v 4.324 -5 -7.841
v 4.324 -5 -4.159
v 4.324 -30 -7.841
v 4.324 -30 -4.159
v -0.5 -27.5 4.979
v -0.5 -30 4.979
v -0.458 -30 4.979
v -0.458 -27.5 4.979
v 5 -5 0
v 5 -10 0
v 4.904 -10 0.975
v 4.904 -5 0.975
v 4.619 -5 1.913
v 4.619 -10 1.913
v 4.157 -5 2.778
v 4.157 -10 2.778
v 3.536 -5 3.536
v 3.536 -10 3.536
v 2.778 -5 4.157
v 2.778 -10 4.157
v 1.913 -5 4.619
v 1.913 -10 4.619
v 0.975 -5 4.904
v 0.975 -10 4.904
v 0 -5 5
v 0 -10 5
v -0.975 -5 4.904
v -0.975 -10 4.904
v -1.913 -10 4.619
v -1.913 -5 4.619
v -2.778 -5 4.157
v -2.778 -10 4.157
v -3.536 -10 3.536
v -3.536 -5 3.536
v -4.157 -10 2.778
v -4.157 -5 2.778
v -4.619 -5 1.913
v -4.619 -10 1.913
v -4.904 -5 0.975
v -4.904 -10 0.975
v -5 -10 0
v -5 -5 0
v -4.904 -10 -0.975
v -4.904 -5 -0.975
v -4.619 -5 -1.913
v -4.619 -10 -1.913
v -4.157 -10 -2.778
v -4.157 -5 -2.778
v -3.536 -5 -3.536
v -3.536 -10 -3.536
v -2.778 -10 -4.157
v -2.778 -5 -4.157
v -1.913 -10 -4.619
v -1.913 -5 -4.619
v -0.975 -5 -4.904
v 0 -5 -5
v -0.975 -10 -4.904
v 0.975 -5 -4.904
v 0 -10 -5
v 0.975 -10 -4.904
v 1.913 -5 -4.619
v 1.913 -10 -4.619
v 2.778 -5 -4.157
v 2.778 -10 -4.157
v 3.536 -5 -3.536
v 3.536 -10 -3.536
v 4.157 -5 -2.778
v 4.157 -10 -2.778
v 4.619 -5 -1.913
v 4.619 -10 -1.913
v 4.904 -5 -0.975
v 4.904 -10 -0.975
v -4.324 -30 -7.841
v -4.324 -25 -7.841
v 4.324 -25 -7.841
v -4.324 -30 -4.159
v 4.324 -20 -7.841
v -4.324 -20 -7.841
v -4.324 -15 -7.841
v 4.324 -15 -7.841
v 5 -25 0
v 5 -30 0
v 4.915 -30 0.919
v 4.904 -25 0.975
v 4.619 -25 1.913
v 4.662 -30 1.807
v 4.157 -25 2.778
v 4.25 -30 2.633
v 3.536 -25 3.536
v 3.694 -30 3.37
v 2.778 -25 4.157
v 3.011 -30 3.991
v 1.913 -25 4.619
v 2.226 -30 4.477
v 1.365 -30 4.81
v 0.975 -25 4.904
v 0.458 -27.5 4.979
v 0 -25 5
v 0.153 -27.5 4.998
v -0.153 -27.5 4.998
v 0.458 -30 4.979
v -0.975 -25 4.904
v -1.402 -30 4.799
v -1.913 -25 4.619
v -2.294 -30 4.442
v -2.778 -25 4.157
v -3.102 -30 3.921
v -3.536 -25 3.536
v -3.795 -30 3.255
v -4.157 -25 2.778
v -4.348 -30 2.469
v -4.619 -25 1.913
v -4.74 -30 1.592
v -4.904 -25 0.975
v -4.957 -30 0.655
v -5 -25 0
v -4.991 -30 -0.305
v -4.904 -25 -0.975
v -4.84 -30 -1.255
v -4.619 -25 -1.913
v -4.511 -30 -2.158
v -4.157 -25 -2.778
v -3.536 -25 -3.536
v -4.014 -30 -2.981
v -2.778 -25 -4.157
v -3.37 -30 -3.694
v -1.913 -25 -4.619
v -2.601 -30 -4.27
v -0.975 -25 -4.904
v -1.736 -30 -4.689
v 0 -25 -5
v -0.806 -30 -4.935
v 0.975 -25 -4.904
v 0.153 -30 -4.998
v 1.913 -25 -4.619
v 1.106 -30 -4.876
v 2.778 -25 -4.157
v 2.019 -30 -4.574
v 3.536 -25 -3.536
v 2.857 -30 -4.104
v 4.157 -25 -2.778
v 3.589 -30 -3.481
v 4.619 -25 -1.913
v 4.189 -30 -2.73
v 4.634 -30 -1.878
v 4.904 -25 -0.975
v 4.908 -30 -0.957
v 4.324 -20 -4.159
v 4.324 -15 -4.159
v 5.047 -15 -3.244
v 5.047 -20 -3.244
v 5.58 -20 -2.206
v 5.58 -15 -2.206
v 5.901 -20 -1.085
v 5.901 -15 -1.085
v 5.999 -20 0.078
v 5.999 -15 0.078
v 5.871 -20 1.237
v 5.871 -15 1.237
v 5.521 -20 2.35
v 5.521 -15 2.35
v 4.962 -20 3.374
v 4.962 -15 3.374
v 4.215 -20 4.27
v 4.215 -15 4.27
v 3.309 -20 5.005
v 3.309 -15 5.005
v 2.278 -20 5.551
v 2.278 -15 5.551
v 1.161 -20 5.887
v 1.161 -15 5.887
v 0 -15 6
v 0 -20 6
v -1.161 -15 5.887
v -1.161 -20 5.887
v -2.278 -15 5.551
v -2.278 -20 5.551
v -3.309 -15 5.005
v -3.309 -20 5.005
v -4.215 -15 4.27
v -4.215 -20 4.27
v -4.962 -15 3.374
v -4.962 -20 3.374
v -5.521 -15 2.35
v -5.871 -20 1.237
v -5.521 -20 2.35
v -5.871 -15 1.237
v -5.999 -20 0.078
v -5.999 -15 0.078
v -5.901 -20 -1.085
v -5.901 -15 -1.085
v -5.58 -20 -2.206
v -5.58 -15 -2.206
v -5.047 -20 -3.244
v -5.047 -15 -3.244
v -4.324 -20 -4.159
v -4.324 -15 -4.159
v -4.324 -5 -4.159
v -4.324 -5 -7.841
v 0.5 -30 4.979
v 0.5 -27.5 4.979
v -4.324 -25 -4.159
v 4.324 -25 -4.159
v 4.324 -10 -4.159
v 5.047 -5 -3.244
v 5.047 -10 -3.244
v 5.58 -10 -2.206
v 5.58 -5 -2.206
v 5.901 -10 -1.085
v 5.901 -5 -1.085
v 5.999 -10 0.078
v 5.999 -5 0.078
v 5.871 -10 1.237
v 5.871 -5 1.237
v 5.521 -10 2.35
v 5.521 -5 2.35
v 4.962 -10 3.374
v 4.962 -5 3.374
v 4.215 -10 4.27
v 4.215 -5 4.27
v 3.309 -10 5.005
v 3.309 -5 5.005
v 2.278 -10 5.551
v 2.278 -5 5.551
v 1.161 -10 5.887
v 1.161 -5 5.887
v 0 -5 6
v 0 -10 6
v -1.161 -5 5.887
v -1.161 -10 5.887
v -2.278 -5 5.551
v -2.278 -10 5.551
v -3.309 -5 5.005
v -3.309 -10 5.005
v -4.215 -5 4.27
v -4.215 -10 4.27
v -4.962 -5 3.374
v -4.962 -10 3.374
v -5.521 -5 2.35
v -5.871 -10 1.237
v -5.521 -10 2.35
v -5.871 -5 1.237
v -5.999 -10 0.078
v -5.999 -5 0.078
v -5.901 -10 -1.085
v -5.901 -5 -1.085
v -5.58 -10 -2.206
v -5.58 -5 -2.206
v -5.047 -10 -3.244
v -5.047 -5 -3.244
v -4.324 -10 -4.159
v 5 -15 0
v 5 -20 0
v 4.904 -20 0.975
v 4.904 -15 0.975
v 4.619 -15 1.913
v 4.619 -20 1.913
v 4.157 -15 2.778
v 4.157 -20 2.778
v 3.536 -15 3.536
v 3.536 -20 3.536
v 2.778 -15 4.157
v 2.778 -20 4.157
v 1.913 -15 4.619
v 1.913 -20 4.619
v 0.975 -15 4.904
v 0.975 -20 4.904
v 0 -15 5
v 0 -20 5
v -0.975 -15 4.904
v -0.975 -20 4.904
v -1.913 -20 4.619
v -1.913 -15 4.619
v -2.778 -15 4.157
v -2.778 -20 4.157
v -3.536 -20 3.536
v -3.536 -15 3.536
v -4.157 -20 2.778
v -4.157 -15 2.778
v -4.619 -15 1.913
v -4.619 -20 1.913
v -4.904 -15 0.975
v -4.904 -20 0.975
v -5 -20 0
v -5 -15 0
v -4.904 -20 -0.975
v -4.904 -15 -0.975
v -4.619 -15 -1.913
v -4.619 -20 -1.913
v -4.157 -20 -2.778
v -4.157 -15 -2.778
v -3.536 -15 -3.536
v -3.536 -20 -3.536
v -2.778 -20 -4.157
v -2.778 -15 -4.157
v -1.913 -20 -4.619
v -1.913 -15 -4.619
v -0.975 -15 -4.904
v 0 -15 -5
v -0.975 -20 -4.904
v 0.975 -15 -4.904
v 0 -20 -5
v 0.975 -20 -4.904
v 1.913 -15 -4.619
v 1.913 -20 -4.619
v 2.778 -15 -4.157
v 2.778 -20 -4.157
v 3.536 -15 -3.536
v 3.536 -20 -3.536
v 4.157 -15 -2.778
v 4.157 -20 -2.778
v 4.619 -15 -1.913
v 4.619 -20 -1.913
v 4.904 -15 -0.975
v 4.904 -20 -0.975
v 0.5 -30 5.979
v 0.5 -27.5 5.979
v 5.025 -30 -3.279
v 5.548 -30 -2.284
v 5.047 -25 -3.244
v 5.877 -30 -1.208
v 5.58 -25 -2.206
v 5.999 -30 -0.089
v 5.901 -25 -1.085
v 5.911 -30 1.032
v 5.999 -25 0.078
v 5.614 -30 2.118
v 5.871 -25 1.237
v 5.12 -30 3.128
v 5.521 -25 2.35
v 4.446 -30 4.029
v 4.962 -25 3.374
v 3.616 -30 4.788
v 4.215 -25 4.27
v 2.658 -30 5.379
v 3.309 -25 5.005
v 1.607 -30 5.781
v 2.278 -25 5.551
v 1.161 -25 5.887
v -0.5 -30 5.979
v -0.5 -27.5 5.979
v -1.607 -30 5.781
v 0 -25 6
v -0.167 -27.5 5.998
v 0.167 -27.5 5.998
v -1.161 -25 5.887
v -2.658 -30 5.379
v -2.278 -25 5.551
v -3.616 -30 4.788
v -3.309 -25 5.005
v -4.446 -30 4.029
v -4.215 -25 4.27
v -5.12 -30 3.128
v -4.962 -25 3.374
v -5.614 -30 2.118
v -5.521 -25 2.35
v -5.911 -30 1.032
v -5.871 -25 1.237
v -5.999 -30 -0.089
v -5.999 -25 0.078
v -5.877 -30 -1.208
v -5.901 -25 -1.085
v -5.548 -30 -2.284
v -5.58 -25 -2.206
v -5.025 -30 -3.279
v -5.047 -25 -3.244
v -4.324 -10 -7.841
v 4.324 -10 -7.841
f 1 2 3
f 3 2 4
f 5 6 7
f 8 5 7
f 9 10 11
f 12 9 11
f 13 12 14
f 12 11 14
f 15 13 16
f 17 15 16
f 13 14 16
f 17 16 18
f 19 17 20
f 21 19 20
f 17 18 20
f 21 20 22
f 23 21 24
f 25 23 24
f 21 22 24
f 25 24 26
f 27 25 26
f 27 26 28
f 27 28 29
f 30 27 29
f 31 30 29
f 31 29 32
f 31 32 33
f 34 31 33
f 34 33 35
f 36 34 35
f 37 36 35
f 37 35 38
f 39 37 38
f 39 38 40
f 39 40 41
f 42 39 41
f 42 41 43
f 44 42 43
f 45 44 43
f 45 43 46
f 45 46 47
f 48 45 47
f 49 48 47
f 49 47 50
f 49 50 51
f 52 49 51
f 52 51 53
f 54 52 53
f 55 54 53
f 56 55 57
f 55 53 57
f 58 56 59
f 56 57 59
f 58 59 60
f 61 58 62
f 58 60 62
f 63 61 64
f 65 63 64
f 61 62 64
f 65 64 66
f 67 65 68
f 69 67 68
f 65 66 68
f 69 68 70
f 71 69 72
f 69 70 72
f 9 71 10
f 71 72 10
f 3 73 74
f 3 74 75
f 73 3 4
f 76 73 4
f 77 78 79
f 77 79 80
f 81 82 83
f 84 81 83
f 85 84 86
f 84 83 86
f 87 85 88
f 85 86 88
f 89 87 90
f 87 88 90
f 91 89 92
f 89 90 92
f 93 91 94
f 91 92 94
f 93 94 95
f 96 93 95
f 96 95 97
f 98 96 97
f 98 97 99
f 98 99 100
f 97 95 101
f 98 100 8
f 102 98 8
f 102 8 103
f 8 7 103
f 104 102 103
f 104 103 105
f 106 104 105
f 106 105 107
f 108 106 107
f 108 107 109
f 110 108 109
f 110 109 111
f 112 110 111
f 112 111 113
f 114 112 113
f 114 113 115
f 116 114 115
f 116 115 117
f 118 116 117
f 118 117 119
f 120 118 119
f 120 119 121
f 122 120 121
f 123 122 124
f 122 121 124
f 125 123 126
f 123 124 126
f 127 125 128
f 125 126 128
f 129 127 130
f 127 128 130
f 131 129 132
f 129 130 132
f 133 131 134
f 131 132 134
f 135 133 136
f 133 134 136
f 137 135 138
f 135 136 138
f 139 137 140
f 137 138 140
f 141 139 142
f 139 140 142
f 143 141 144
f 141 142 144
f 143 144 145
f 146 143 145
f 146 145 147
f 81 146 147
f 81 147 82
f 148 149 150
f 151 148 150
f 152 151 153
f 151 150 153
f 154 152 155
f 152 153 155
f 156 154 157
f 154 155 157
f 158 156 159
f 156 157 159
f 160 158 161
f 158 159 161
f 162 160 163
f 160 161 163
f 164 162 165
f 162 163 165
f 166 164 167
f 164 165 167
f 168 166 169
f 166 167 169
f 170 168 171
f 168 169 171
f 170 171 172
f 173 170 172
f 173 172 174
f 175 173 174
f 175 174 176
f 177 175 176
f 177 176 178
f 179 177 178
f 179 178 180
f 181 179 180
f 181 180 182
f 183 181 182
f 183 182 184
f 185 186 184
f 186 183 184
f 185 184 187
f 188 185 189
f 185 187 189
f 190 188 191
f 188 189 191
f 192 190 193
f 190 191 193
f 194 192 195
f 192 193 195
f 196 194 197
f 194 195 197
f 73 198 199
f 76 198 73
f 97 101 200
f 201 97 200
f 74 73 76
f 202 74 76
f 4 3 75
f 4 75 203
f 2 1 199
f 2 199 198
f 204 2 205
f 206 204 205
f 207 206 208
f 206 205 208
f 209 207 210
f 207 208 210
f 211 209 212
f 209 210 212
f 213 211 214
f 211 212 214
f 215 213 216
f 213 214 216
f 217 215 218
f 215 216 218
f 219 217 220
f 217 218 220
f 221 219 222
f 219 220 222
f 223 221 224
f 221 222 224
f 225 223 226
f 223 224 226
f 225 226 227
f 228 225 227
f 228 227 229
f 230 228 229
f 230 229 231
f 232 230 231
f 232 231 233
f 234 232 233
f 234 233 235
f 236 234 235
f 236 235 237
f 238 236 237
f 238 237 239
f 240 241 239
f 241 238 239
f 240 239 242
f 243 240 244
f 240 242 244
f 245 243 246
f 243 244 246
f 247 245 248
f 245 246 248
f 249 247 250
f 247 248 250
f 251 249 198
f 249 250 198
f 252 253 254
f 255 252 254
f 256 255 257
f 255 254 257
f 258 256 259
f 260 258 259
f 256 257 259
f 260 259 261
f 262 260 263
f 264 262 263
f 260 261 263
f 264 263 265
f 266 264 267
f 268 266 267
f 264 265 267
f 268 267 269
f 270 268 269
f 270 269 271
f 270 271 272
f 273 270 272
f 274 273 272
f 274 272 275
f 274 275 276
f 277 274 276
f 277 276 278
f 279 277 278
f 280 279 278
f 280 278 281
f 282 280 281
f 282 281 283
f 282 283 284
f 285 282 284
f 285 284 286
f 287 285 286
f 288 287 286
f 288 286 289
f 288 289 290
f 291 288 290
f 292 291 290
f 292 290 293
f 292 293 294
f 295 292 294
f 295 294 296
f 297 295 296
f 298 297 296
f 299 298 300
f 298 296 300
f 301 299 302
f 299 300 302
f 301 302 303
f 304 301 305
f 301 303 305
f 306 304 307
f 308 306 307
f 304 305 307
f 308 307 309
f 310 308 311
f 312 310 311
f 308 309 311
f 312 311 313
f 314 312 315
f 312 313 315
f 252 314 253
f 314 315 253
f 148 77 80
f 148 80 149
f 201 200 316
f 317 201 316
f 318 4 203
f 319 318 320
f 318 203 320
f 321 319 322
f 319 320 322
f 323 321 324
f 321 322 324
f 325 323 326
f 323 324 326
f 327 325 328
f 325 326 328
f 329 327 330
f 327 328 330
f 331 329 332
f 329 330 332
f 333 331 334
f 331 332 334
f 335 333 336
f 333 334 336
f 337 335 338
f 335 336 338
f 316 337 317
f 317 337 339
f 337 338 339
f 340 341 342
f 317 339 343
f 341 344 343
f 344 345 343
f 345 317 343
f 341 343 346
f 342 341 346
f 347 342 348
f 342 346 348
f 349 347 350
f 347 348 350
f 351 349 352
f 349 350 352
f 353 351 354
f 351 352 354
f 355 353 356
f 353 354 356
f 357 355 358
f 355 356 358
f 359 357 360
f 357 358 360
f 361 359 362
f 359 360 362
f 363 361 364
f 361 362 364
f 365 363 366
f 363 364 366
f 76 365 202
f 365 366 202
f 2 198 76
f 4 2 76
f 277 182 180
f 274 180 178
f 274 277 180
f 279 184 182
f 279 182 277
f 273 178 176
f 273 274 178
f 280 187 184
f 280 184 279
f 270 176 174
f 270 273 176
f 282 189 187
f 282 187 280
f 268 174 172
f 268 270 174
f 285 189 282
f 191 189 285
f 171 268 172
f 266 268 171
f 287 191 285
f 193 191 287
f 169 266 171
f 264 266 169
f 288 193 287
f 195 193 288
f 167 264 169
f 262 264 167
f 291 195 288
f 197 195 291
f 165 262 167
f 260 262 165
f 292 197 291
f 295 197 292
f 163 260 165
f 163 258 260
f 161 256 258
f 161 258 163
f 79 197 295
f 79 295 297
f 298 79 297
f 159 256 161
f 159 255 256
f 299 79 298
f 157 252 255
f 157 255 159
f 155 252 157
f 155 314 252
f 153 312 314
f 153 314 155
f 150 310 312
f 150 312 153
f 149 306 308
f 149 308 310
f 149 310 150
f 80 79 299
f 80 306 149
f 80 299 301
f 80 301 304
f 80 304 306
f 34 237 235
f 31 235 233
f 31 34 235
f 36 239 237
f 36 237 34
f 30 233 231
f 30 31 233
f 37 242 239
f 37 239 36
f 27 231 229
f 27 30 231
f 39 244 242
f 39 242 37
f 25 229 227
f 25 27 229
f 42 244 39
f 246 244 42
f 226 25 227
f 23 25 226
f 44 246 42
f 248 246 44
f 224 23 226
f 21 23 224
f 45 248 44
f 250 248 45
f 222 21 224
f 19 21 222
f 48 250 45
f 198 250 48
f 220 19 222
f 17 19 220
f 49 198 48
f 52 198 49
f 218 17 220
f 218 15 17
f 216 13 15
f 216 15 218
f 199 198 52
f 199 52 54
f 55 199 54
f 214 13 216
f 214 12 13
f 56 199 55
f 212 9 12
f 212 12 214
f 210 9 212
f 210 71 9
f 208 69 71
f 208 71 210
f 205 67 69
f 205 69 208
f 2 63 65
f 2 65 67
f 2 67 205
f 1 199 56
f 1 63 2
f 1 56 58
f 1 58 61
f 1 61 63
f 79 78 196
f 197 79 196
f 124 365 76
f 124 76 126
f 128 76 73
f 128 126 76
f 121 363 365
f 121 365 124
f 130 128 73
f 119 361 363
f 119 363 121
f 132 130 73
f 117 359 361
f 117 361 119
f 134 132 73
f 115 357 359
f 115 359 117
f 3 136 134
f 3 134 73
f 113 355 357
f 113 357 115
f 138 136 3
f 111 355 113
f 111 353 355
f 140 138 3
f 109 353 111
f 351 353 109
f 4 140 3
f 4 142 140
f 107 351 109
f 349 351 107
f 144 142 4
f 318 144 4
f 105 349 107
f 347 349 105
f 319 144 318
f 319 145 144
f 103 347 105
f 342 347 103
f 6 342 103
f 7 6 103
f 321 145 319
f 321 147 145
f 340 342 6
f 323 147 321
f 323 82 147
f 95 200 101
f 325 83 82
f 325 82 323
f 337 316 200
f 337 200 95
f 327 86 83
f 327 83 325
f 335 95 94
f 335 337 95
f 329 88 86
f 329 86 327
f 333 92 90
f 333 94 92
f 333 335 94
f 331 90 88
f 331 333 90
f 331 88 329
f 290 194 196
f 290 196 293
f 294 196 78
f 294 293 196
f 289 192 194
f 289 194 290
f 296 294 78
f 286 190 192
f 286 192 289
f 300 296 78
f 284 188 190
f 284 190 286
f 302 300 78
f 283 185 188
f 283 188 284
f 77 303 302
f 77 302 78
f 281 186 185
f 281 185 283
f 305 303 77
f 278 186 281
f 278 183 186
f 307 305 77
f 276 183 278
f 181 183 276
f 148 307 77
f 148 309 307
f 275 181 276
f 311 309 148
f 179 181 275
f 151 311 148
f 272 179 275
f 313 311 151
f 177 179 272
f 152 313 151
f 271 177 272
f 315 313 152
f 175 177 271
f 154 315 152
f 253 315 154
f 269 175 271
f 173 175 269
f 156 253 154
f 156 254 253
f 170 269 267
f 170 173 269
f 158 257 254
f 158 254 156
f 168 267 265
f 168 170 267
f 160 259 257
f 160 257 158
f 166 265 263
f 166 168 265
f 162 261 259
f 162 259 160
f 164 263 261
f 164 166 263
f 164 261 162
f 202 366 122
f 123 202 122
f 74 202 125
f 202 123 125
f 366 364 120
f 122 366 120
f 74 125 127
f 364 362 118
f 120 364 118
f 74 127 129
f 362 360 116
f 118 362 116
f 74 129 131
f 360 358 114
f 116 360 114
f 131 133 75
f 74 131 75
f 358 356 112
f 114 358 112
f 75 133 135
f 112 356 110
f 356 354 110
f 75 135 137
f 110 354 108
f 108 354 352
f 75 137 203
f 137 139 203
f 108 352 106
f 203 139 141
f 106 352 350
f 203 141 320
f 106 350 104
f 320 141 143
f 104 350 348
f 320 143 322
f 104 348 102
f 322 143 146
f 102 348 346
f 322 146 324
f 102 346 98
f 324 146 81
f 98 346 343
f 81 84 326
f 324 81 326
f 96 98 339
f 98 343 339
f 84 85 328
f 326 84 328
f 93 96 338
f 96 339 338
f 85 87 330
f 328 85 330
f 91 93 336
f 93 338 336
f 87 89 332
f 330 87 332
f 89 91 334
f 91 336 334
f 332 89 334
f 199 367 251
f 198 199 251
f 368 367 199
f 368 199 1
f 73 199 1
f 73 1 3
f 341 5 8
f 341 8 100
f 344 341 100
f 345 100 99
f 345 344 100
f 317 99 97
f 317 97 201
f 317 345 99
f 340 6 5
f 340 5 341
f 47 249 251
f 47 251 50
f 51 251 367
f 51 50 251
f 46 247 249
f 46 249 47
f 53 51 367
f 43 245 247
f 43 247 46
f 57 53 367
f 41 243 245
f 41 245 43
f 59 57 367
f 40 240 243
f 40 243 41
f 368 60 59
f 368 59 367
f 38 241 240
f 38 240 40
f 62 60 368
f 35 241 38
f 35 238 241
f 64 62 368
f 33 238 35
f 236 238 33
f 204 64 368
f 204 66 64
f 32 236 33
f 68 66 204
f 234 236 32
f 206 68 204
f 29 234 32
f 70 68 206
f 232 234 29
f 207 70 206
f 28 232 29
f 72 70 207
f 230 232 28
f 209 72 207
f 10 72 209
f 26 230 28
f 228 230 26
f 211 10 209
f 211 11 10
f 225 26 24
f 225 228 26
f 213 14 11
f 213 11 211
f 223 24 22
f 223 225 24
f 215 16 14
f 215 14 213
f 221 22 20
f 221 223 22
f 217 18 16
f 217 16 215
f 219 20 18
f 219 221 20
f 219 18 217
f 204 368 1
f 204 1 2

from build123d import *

# Parameters (mm, degrees)
F0_R          = 6
F1_DEPTH      = 30
F2_W          = 8.6483662619
F2_H          = 3.681
F3_DEPTH      = 30
F5_W          = 12
F5_H          = 5
F6_DEPTH      = 7.8405
F6_DEPTH_BACK = 25
F7_W          = 25
F7_H          = 3.681
F8_DEPTH      = 8.6483662619
F4_R          = 5
F9_DEPTH      = 25.001
F10_W         = 1
F10_H         = 1.021
F11_DEPTH     = 2.5


with BuildPart() as f1:
    # F0 (on Front) → F1 (new body)
    with BuildSketch(Plane.XZ):
        Circle(F0_R)
    extrude(amount=F1_DEPTH)

    # F2 (on face) → F3 (join, through all)
    with BuildSketch(Plane.XZ.offset(30)):
        with Locations((0, -6)):
            Rectangle(F2_W, F2_H)
    extrude(amount=-F3_DEPTH)

    # F5 (on Top) → F6 (cut, two sides)
    with BuildSketch(Plane.XY) as f6_sk:
        with Locations((0, -22.5)):
            Rectangle(F5_W, F5_H)
        with Locations((0, -2.5)):
            Rectangle(F5_W, F5_H)
        with Locations((0, -12.5)):
            Rectangle(F5_W, F5_H)
    extrude(amount=-F6_DEPTH, mode=Mode.SUBTRACT)
    extrude(f6_sk.sketch, amount=F6_DEPTH_BACK, mode=Mode.SUBTRACT)

    # F4 (on face) → F9 (cut, through all)
    with BuildSketch(Plane.XZ.offset(30)):
        Circle(F4_R)
    extrude(amount=-F9_DEPTH, mode=Mode.SUBTRACT)

    # F10 (on face) → F11 (cut, through all)
    with BuildSketch(Plane.XZ.offset(30)):
        with Locations((0, 5.4895)):
            Rectangle(F10_W, F10_H)
    extrude(amount=-F11_DEPTH, mode=Mode.SUBTRACT)


with BuildPart() as f8:
    # F7 (on face) → F8 (new body, through all)
    with BuildSketch(Plane(origin=(-4.324183131, 0, 0), x_dir=(0, -1, 0), z_dir=(-1, 0, 0))):
        with Locations((17.5, -6)):
            Rectangle(F7_W, F7_H)
    extrude(amount=-F8_DEPTH)


solid = Compound([f1.part, f8.part])
